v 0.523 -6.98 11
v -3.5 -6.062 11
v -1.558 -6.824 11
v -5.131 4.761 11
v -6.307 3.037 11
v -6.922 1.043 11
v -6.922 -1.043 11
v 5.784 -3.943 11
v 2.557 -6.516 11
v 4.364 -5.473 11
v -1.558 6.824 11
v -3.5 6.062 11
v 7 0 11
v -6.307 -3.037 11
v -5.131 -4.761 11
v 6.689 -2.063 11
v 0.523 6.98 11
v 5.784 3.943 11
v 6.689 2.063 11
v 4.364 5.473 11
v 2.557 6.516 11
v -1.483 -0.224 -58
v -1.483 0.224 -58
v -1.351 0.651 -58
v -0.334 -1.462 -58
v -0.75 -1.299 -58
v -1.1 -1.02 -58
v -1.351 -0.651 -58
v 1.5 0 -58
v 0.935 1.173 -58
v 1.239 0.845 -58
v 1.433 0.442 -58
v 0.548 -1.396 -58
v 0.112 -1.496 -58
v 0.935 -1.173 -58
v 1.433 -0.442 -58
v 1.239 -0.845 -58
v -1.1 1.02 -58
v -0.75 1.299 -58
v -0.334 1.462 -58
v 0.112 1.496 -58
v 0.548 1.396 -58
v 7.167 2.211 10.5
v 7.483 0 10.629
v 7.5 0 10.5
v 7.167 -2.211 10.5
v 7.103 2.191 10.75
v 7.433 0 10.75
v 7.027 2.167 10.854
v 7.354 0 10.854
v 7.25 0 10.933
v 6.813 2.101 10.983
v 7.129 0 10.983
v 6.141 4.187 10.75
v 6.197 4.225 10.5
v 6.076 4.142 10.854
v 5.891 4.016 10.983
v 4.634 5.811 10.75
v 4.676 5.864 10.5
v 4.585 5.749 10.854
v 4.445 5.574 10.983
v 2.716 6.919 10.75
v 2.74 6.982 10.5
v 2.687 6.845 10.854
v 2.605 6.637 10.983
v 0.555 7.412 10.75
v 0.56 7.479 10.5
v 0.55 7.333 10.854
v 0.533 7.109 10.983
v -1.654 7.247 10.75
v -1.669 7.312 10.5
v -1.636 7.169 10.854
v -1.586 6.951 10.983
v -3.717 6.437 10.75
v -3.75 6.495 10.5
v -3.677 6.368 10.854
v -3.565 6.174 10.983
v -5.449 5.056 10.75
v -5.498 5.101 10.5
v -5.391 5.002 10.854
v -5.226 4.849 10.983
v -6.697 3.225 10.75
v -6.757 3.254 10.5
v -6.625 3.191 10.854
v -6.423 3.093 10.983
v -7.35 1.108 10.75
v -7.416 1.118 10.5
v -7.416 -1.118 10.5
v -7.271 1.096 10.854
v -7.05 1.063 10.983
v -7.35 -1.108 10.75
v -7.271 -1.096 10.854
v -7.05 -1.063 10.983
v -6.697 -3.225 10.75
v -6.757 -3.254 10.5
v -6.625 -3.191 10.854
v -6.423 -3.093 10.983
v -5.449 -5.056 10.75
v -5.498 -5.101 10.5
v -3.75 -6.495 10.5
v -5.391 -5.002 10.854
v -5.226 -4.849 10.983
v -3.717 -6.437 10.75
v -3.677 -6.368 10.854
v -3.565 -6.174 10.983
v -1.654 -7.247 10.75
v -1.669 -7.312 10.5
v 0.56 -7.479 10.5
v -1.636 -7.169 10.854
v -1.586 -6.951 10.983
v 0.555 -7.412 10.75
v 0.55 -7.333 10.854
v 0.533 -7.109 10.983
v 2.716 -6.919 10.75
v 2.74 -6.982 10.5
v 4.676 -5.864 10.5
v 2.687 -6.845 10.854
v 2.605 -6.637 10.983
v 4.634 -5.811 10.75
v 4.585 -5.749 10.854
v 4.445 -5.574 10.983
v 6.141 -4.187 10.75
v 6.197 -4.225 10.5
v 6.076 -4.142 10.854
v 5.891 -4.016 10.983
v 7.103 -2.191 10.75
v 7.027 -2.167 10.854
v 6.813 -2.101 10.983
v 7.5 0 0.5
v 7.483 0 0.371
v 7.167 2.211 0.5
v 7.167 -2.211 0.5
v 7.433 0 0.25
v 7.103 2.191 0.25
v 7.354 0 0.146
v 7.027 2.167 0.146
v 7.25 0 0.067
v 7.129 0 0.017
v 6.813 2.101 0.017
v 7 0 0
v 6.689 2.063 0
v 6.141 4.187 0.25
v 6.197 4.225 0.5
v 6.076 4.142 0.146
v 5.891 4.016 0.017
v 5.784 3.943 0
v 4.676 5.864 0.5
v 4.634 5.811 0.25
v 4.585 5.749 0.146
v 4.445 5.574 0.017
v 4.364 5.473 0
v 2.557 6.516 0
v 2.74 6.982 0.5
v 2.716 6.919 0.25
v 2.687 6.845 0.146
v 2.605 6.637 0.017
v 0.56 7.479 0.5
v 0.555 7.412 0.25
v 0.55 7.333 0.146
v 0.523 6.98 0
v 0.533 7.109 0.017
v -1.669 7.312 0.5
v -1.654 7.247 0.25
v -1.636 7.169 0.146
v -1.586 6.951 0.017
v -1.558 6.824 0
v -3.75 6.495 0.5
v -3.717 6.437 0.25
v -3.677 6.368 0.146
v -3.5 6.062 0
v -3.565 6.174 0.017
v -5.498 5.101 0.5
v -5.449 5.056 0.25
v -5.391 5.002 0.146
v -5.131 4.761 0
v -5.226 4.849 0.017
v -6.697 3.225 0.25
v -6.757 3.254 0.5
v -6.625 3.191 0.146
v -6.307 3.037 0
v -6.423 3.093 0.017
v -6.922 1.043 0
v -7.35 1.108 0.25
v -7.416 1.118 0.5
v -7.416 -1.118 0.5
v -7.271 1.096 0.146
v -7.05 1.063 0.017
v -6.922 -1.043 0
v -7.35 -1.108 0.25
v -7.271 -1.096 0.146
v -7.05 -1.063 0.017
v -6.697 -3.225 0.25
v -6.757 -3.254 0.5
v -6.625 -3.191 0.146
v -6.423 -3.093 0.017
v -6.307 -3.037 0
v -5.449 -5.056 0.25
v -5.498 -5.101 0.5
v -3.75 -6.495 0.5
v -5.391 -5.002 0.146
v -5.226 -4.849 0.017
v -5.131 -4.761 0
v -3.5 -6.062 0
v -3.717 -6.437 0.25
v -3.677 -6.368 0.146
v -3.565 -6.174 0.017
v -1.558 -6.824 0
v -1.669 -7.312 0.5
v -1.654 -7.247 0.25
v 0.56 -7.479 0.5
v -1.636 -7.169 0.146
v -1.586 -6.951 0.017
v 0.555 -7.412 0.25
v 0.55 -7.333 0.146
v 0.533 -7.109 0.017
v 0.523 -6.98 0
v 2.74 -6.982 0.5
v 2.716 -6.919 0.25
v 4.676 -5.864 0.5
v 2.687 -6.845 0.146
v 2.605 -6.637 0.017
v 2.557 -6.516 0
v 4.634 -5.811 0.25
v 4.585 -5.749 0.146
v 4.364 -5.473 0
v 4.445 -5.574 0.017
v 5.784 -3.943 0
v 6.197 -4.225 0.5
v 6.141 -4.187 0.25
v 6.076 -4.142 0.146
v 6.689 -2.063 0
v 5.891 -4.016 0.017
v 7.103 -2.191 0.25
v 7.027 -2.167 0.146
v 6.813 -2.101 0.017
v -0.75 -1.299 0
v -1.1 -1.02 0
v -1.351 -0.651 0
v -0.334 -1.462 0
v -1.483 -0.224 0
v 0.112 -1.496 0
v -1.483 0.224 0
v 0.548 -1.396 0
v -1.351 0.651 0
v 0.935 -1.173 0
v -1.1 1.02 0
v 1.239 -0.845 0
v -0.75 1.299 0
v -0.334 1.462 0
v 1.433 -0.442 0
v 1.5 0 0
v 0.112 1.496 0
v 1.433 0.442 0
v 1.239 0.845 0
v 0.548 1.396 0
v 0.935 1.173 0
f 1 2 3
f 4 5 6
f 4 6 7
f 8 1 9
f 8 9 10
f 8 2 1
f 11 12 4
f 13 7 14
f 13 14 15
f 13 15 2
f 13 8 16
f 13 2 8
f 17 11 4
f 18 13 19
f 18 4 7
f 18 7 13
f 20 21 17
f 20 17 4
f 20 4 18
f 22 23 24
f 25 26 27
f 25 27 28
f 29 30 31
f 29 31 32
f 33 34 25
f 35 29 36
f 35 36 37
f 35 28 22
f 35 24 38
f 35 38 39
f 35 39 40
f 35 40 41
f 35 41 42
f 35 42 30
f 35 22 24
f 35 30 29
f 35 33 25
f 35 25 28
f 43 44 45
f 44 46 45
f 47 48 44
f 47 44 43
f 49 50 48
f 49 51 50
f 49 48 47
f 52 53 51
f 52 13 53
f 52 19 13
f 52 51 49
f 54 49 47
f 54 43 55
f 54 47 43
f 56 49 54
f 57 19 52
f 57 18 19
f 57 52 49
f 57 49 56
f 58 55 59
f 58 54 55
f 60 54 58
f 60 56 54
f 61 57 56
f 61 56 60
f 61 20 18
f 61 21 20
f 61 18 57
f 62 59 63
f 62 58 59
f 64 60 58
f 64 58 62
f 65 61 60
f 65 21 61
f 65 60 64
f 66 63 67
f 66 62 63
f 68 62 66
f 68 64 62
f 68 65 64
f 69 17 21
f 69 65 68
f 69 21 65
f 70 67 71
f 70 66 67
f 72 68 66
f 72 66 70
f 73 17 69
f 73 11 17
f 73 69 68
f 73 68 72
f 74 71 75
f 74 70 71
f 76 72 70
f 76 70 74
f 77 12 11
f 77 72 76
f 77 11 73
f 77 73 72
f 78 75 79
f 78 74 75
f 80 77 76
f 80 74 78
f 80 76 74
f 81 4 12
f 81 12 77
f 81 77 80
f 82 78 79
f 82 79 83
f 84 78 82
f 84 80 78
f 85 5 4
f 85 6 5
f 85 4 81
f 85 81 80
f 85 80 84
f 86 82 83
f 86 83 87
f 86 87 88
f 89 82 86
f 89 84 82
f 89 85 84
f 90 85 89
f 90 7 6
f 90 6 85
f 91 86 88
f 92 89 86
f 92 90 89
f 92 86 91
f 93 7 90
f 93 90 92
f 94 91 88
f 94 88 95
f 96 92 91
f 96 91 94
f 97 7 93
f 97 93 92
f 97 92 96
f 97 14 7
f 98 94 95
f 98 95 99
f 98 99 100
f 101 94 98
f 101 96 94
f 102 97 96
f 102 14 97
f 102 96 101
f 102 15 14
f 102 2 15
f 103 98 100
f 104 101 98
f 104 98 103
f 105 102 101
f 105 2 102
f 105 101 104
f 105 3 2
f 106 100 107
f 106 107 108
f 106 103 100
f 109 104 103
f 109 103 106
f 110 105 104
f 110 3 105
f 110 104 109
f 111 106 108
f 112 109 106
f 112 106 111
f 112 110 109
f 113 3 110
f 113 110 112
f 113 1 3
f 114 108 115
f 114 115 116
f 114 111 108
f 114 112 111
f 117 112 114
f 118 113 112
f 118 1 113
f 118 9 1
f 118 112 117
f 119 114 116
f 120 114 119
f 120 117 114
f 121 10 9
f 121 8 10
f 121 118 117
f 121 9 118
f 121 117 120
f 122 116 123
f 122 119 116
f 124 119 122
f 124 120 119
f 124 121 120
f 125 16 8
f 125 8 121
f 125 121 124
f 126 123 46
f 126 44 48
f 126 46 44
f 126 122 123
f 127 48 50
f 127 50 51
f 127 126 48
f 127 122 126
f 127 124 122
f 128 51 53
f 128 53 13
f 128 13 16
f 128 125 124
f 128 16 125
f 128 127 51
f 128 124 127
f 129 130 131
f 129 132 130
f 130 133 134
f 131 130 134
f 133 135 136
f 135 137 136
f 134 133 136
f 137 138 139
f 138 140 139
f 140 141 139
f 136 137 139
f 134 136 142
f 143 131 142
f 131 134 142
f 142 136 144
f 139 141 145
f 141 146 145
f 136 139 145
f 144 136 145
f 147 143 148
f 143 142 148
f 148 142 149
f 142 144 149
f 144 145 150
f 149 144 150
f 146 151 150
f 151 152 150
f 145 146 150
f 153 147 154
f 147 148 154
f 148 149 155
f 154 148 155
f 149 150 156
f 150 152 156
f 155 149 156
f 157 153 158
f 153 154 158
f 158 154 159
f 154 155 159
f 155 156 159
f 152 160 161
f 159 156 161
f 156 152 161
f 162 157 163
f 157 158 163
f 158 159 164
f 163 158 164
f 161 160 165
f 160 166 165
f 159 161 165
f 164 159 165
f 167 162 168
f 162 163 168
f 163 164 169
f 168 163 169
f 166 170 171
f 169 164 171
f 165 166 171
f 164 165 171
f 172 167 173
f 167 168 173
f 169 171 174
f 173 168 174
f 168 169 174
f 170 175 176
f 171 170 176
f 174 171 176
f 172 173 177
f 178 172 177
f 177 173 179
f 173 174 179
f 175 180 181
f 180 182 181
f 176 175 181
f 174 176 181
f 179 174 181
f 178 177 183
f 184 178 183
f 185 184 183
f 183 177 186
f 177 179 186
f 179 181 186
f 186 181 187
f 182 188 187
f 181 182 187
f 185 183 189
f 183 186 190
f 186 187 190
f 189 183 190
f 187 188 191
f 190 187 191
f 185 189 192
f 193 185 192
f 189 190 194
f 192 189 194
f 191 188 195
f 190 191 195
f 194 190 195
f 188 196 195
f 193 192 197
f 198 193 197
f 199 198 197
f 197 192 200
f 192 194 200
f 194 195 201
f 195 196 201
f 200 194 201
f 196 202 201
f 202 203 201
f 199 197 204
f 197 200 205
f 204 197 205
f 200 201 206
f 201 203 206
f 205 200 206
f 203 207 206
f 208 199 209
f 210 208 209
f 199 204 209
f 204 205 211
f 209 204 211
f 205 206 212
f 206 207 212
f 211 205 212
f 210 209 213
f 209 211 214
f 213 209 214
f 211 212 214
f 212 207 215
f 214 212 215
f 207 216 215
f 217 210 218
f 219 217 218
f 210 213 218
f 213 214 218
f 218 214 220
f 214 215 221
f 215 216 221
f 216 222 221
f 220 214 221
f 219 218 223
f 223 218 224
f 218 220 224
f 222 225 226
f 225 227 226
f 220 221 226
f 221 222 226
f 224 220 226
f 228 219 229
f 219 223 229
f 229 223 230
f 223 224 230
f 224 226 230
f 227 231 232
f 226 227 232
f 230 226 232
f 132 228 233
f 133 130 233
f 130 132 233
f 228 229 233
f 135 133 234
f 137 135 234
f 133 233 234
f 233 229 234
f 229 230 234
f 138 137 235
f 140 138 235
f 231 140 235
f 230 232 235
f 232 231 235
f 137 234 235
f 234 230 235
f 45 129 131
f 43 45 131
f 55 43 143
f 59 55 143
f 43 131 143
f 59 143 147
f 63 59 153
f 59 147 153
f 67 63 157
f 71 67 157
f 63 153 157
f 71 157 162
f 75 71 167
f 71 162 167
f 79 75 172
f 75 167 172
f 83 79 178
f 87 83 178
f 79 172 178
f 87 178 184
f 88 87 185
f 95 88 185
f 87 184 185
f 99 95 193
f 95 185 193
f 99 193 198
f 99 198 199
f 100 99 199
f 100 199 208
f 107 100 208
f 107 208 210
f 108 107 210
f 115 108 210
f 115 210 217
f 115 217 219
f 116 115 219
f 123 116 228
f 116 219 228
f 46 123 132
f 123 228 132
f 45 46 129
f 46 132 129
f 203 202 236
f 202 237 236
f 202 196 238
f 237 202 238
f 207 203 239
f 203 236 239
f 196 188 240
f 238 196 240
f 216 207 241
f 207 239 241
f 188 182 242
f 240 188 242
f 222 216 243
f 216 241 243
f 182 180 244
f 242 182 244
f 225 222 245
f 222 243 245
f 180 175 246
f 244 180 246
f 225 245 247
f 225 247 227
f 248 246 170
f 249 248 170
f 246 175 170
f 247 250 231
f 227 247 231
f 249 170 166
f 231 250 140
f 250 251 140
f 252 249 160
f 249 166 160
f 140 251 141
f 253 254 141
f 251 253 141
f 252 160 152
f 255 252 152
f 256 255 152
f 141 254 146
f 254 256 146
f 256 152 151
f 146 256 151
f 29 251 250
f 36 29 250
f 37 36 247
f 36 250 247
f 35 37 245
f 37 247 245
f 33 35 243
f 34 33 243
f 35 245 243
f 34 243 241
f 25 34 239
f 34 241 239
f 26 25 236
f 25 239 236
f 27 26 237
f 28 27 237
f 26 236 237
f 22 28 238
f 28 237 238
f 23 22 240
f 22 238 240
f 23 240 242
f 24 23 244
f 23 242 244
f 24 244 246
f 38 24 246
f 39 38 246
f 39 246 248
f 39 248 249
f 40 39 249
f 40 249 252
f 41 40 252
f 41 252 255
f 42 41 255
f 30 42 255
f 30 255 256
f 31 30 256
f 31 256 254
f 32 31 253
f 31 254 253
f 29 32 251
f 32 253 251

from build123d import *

# Parameters (mm, degrees)
SKETCH_1_R      = 7.5
EXTRUDE_1_DEPTH = 11
FILLET_1_R      = 0.5
SKETCH_2_R      = 1.5
EXTRUDE_2_DEPTH = 58


with BuildPart() as part:
    # 草图1 → 凸台-拉伸1 (new body)
    with BuildSketch(Plane.XY):
        Circle(SKETCH_1_R)
    extrude(amount=EXTRUDE_1_DEPTH)

    # 圆角1
    fillet_1_edges = [part.edges().sort_by_distance(p)[0] for p in [
        (-7.5, 0, 0),
        (-7.5, 0, 11),
    ]]
    fillet(fillet_1_edges, radius=FILLET_1_R)

    # 草图2 → 凸台-拉伸2 (add)
    with BuildSketch(Plane(origin=(0, 0, 0), x_dir=(-1, 0, 0), z_dir=(0, 0, -1))):
        with Locations(Location((0, 0, 0), (0, 0, 180))):
            Circle(SKETCH_2_R)
    extrude(amount=EXTRUDE_2_DEPTH)


solid = part.part
